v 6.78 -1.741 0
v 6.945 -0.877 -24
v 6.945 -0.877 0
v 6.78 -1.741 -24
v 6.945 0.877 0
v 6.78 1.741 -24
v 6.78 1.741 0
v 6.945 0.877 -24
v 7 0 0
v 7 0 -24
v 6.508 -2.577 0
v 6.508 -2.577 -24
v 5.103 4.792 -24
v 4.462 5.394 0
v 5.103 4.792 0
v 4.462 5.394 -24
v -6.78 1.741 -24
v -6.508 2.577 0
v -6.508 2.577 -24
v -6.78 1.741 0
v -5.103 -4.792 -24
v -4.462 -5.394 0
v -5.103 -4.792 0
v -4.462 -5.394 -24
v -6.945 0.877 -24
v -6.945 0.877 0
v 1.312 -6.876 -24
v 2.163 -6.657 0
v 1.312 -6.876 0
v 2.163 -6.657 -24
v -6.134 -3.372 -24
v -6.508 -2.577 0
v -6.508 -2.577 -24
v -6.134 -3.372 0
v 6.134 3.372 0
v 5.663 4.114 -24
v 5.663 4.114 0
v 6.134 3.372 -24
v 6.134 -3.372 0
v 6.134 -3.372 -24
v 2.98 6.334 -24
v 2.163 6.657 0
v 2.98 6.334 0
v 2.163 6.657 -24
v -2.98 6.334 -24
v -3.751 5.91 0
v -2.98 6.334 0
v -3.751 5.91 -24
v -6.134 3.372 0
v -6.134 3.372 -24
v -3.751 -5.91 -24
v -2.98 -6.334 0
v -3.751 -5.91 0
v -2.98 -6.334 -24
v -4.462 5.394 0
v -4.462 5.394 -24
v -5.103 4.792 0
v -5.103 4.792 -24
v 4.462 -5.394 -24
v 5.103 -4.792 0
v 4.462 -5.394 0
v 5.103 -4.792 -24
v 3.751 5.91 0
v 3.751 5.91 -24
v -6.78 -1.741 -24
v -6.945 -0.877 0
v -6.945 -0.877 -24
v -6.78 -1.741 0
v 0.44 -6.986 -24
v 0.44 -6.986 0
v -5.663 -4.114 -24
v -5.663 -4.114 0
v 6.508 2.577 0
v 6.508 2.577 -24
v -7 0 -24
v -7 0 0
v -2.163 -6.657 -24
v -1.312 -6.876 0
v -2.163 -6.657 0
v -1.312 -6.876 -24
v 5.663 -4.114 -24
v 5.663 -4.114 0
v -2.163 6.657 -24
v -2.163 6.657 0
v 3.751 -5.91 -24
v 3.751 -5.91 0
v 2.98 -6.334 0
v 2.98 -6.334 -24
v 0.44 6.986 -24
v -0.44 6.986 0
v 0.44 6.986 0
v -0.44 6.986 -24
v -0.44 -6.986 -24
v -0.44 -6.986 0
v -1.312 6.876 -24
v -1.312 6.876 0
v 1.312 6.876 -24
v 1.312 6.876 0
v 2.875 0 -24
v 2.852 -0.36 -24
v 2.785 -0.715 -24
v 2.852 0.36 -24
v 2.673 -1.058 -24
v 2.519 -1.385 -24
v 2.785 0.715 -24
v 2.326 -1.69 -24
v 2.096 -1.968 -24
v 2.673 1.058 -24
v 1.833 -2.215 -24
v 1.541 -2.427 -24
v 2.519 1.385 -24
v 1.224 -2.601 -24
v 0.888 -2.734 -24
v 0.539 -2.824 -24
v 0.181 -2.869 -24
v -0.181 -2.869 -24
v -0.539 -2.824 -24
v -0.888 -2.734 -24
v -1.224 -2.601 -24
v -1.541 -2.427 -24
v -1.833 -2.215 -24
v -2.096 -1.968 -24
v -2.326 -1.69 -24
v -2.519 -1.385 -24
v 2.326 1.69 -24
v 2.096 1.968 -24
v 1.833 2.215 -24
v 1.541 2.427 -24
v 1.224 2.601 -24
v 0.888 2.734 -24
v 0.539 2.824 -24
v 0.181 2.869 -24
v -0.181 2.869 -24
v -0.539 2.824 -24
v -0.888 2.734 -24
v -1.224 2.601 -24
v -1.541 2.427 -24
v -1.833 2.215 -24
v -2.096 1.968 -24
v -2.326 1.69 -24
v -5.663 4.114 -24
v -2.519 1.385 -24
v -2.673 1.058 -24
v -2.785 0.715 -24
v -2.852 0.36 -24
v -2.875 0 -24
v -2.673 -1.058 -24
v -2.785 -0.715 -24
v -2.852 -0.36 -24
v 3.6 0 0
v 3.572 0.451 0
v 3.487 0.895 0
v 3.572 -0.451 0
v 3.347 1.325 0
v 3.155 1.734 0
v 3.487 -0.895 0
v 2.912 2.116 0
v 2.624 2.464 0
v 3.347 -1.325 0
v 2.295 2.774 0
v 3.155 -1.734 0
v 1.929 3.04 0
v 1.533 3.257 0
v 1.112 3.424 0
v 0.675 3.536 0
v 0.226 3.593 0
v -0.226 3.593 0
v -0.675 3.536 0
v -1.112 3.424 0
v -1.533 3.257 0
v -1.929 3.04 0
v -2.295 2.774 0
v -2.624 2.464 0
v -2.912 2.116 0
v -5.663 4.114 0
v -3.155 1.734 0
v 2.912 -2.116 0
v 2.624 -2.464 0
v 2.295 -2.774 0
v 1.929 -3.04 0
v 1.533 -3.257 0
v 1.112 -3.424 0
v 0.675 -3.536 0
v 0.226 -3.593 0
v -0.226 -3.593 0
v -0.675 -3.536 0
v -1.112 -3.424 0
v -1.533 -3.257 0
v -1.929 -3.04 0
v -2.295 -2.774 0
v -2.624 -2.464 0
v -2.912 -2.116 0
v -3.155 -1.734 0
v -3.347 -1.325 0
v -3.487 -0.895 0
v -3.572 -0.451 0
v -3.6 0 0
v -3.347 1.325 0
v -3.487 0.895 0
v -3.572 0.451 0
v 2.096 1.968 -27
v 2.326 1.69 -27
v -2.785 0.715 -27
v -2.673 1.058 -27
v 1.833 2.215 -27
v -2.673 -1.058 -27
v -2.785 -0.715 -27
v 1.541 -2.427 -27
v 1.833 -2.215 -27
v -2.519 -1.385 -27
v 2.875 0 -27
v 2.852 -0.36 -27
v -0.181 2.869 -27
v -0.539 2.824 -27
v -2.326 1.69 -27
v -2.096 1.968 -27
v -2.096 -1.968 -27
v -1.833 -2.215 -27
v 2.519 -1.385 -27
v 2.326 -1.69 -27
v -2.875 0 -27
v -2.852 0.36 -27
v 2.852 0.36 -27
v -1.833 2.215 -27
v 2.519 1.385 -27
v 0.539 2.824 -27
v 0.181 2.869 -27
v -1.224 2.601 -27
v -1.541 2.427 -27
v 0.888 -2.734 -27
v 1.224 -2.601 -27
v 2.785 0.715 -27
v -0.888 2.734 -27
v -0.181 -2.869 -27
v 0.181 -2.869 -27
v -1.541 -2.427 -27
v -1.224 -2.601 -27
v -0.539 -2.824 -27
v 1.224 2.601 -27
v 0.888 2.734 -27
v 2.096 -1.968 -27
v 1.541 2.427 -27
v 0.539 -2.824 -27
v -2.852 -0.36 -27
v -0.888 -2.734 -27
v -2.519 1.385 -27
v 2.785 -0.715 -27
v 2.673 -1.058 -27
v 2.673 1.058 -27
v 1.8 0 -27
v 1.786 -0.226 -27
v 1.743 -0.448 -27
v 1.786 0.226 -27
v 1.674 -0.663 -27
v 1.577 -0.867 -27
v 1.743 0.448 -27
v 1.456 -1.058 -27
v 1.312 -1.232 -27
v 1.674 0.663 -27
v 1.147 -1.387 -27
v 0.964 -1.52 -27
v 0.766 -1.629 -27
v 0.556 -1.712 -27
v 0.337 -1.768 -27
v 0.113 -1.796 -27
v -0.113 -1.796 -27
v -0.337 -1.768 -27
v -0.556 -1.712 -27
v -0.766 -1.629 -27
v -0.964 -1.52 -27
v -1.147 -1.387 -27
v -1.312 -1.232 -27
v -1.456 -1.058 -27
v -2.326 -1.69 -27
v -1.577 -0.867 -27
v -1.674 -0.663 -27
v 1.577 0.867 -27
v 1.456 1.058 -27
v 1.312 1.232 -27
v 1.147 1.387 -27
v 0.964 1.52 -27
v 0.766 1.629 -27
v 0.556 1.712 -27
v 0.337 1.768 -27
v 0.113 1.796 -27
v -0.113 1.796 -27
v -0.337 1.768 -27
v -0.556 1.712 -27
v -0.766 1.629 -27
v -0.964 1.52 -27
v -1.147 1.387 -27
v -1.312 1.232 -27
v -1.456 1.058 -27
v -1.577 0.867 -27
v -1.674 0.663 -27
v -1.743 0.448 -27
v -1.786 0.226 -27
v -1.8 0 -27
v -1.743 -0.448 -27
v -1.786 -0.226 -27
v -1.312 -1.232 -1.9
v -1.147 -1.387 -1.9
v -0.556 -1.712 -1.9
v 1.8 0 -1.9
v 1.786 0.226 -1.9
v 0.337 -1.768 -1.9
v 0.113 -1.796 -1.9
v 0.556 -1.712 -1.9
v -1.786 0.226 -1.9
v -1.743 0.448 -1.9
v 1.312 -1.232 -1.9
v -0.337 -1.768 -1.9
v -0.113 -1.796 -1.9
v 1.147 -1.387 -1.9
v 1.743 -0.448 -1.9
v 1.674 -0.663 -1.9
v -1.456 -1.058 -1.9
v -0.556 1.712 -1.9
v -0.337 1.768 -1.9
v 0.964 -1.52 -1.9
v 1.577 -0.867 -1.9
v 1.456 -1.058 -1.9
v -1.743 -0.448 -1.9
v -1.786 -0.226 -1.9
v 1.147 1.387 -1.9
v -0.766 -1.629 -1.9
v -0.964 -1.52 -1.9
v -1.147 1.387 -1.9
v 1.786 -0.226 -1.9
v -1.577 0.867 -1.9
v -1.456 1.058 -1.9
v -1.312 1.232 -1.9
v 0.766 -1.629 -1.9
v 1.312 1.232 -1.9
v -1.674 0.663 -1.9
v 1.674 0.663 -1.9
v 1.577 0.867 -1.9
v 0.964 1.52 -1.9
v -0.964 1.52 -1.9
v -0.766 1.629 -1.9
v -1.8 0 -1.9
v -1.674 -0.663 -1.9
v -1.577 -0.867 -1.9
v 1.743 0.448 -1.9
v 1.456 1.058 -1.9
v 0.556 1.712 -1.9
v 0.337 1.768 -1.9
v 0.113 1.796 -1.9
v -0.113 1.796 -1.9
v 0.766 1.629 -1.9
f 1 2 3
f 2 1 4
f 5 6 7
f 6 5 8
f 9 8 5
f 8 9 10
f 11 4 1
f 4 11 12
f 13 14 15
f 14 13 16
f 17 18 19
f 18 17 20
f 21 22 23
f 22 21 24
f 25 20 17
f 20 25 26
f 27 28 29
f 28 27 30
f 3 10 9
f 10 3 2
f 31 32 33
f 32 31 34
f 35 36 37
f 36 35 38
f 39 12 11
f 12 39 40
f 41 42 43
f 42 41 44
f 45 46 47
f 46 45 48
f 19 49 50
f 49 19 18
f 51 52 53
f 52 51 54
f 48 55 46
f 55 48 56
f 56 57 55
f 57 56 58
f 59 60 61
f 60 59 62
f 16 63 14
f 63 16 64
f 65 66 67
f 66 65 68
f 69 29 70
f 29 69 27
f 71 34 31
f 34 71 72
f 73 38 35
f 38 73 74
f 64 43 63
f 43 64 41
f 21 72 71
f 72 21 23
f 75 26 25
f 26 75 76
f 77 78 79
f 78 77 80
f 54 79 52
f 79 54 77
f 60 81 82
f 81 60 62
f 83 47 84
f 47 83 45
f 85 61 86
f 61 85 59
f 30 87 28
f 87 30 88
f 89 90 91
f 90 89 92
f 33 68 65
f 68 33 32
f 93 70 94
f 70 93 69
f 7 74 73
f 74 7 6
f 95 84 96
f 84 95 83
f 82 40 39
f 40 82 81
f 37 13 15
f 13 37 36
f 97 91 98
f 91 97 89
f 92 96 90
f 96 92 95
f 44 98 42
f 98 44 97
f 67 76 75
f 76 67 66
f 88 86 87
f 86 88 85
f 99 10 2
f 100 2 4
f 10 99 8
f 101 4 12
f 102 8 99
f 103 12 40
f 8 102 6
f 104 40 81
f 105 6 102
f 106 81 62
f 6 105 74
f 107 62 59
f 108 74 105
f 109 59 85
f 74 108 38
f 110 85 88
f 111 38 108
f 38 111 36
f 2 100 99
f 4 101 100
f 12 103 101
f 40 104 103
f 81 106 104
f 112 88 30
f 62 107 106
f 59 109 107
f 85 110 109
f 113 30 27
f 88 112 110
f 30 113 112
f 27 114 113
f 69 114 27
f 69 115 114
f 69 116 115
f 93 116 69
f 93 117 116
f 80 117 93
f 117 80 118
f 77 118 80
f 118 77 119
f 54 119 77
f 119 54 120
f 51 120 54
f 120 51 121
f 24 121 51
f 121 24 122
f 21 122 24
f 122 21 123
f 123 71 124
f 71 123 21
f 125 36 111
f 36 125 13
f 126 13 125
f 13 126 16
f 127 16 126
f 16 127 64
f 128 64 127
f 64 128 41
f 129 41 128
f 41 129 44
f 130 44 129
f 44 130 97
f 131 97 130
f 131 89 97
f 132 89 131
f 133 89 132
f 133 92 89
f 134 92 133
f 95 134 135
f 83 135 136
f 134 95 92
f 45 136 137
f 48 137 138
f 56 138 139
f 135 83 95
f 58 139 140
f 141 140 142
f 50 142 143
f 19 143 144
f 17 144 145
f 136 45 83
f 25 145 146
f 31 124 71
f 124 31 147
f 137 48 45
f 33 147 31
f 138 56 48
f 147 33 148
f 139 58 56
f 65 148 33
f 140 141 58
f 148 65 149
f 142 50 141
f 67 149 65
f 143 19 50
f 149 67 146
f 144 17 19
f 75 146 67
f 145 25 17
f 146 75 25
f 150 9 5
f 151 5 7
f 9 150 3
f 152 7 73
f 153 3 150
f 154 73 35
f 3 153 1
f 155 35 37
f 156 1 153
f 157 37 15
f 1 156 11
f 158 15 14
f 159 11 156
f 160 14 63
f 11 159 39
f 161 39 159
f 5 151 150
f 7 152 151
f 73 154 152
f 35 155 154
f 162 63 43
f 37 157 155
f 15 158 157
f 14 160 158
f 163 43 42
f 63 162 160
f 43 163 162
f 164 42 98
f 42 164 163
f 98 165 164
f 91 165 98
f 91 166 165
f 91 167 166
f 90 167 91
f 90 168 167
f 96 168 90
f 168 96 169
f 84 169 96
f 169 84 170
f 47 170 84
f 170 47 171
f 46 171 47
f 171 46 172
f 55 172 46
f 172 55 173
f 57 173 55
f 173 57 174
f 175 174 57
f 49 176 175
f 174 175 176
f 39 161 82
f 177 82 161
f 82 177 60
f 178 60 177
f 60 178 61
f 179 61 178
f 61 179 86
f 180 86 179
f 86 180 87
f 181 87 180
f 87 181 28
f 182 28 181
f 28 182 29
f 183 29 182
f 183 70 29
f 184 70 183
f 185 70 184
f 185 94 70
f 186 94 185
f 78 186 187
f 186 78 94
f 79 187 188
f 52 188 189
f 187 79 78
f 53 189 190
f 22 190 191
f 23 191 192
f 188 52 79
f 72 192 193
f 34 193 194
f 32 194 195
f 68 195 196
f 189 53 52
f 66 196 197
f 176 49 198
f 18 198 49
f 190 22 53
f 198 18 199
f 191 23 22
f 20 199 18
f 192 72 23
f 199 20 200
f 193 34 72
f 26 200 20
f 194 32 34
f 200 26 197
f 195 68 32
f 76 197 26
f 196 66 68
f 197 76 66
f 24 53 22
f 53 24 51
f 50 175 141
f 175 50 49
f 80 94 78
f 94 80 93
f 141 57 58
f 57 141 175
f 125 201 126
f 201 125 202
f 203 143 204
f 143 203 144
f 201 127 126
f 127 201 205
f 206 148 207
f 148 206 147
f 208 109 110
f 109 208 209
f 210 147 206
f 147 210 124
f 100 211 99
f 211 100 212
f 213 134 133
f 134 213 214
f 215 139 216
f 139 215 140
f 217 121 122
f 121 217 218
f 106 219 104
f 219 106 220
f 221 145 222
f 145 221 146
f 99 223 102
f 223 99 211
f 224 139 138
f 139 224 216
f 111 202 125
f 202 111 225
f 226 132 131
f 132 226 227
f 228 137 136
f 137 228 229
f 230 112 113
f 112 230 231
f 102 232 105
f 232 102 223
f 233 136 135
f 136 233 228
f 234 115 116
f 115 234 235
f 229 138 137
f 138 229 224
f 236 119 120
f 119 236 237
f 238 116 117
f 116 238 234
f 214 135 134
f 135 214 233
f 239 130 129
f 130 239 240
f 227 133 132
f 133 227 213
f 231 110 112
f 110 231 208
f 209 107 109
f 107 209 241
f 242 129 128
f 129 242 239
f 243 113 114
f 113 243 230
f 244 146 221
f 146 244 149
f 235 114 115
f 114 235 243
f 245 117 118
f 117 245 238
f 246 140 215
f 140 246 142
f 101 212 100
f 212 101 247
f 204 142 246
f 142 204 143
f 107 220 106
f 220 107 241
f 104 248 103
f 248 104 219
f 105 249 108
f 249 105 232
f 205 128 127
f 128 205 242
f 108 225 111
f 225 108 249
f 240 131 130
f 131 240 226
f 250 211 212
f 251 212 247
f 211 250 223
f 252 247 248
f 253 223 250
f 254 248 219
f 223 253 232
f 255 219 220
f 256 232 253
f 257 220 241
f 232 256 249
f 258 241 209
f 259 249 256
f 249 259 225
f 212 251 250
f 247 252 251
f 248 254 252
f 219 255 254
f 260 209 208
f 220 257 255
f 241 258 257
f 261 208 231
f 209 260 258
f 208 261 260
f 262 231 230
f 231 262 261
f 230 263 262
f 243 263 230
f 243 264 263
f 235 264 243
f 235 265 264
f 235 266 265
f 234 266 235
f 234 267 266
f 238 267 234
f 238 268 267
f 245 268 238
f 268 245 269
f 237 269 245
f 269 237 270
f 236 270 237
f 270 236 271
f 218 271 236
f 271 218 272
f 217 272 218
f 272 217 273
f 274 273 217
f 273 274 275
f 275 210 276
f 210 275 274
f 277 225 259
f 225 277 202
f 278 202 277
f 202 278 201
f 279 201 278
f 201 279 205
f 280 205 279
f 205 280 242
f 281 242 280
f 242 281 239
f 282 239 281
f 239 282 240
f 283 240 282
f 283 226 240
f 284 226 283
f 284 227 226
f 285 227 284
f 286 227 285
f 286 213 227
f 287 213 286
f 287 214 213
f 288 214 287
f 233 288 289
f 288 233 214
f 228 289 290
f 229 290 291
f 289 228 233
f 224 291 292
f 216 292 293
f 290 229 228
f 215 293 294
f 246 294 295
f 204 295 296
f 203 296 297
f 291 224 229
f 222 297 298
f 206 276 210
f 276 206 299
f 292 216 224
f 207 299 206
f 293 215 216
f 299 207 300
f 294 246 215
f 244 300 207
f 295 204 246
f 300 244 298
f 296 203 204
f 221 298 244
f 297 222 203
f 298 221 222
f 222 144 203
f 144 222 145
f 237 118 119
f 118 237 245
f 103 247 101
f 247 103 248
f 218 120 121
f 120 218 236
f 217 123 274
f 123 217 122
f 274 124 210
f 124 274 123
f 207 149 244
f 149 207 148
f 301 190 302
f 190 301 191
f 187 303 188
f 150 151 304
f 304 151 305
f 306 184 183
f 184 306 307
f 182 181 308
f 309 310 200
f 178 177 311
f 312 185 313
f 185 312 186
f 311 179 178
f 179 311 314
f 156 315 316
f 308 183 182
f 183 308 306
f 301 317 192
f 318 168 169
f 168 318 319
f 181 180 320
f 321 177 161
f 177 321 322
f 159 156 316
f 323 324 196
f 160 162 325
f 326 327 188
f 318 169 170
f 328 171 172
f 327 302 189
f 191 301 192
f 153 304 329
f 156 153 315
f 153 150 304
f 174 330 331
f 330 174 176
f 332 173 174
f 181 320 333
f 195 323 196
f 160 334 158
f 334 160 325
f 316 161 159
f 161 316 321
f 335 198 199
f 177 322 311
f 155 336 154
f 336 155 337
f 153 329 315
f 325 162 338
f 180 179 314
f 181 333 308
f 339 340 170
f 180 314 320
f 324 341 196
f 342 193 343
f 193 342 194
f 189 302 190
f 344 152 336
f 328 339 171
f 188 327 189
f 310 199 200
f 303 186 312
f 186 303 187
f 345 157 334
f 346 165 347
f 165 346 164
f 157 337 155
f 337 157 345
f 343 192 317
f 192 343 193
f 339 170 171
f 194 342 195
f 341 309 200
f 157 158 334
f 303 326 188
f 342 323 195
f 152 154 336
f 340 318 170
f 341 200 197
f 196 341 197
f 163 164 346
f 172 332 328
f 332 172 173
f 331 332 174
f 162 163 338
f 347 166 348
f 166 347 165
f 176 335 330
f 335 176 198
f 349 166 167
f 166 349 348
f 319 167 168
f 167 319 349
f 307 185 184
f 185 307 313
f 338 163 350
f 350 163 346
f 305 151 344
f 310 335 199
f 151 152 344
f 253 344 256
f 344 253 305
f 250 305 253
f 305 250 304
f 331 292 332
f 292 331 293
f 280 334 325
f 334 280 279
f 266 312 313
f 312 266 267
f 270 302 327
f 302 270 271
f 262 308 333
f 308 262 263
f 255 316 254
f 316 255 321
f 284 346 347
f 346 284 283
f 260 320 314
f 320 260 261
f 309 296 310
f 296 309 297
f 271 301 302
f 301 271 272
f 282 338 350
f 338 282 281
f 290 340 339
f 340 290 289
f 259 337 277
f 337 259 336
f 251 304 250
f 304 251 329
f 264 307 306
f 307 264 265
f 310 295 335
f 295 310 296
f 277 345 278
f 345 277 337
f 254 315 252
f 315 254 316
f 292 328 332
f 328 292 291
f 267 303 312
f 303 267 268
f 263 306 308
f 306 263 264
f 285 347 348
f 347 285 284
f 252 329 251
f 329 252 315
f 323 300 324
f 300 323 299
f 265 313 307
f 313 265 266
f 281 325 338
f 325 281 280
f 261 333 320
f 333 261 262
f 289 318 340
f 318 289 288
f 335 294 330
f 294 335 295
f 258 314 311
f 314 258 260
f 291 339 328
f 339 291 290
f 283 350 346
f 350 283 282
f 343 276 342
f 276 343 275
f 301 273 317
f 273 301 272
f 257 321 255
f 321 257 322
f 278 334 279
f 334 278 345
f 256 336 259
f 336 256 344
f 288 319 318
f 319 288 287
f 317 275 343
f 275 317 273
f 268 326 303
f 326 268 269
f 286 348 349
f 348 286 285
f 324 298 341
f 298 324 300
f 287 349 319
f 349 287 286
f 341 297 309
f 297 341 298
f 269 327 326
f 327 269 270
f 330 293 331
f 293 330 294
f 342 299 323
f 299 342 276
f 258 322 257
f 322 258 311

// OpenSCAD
$fn = 50;

difference() {
	union() {
		translate(v = [0, 0, -24.0]) {
			cylinder(h = 24, r = 7.0);
		}
		#translate(v = [0, 0, -27.0]) {
			cylinder(h = 27, r = 2.875);
		}
	}
	union() {
		translate(v = [0, 0, 0]) {
			rotate(a = [0, 0, 0]) {
				difference() {
					union() {
						translate(v = [0, 0, -27.0]) {
							cylinder(h = 27, r = 1.5);
						}
						translate(v = [0, 0, -1.9]) {
							cylinder(h = 1.9, r1 = 1.8, r2 = 3.6);
						}
						translate(v = [0, 0, -27.0]) {
							cylinder(h = 27, r = 1.8);
						}
						translate(v = [0, 0, -27.0]) {
							cylinder(h = 27, r = 1.5);
						}
					}
					union();
				}
			}
		}
	}
}
